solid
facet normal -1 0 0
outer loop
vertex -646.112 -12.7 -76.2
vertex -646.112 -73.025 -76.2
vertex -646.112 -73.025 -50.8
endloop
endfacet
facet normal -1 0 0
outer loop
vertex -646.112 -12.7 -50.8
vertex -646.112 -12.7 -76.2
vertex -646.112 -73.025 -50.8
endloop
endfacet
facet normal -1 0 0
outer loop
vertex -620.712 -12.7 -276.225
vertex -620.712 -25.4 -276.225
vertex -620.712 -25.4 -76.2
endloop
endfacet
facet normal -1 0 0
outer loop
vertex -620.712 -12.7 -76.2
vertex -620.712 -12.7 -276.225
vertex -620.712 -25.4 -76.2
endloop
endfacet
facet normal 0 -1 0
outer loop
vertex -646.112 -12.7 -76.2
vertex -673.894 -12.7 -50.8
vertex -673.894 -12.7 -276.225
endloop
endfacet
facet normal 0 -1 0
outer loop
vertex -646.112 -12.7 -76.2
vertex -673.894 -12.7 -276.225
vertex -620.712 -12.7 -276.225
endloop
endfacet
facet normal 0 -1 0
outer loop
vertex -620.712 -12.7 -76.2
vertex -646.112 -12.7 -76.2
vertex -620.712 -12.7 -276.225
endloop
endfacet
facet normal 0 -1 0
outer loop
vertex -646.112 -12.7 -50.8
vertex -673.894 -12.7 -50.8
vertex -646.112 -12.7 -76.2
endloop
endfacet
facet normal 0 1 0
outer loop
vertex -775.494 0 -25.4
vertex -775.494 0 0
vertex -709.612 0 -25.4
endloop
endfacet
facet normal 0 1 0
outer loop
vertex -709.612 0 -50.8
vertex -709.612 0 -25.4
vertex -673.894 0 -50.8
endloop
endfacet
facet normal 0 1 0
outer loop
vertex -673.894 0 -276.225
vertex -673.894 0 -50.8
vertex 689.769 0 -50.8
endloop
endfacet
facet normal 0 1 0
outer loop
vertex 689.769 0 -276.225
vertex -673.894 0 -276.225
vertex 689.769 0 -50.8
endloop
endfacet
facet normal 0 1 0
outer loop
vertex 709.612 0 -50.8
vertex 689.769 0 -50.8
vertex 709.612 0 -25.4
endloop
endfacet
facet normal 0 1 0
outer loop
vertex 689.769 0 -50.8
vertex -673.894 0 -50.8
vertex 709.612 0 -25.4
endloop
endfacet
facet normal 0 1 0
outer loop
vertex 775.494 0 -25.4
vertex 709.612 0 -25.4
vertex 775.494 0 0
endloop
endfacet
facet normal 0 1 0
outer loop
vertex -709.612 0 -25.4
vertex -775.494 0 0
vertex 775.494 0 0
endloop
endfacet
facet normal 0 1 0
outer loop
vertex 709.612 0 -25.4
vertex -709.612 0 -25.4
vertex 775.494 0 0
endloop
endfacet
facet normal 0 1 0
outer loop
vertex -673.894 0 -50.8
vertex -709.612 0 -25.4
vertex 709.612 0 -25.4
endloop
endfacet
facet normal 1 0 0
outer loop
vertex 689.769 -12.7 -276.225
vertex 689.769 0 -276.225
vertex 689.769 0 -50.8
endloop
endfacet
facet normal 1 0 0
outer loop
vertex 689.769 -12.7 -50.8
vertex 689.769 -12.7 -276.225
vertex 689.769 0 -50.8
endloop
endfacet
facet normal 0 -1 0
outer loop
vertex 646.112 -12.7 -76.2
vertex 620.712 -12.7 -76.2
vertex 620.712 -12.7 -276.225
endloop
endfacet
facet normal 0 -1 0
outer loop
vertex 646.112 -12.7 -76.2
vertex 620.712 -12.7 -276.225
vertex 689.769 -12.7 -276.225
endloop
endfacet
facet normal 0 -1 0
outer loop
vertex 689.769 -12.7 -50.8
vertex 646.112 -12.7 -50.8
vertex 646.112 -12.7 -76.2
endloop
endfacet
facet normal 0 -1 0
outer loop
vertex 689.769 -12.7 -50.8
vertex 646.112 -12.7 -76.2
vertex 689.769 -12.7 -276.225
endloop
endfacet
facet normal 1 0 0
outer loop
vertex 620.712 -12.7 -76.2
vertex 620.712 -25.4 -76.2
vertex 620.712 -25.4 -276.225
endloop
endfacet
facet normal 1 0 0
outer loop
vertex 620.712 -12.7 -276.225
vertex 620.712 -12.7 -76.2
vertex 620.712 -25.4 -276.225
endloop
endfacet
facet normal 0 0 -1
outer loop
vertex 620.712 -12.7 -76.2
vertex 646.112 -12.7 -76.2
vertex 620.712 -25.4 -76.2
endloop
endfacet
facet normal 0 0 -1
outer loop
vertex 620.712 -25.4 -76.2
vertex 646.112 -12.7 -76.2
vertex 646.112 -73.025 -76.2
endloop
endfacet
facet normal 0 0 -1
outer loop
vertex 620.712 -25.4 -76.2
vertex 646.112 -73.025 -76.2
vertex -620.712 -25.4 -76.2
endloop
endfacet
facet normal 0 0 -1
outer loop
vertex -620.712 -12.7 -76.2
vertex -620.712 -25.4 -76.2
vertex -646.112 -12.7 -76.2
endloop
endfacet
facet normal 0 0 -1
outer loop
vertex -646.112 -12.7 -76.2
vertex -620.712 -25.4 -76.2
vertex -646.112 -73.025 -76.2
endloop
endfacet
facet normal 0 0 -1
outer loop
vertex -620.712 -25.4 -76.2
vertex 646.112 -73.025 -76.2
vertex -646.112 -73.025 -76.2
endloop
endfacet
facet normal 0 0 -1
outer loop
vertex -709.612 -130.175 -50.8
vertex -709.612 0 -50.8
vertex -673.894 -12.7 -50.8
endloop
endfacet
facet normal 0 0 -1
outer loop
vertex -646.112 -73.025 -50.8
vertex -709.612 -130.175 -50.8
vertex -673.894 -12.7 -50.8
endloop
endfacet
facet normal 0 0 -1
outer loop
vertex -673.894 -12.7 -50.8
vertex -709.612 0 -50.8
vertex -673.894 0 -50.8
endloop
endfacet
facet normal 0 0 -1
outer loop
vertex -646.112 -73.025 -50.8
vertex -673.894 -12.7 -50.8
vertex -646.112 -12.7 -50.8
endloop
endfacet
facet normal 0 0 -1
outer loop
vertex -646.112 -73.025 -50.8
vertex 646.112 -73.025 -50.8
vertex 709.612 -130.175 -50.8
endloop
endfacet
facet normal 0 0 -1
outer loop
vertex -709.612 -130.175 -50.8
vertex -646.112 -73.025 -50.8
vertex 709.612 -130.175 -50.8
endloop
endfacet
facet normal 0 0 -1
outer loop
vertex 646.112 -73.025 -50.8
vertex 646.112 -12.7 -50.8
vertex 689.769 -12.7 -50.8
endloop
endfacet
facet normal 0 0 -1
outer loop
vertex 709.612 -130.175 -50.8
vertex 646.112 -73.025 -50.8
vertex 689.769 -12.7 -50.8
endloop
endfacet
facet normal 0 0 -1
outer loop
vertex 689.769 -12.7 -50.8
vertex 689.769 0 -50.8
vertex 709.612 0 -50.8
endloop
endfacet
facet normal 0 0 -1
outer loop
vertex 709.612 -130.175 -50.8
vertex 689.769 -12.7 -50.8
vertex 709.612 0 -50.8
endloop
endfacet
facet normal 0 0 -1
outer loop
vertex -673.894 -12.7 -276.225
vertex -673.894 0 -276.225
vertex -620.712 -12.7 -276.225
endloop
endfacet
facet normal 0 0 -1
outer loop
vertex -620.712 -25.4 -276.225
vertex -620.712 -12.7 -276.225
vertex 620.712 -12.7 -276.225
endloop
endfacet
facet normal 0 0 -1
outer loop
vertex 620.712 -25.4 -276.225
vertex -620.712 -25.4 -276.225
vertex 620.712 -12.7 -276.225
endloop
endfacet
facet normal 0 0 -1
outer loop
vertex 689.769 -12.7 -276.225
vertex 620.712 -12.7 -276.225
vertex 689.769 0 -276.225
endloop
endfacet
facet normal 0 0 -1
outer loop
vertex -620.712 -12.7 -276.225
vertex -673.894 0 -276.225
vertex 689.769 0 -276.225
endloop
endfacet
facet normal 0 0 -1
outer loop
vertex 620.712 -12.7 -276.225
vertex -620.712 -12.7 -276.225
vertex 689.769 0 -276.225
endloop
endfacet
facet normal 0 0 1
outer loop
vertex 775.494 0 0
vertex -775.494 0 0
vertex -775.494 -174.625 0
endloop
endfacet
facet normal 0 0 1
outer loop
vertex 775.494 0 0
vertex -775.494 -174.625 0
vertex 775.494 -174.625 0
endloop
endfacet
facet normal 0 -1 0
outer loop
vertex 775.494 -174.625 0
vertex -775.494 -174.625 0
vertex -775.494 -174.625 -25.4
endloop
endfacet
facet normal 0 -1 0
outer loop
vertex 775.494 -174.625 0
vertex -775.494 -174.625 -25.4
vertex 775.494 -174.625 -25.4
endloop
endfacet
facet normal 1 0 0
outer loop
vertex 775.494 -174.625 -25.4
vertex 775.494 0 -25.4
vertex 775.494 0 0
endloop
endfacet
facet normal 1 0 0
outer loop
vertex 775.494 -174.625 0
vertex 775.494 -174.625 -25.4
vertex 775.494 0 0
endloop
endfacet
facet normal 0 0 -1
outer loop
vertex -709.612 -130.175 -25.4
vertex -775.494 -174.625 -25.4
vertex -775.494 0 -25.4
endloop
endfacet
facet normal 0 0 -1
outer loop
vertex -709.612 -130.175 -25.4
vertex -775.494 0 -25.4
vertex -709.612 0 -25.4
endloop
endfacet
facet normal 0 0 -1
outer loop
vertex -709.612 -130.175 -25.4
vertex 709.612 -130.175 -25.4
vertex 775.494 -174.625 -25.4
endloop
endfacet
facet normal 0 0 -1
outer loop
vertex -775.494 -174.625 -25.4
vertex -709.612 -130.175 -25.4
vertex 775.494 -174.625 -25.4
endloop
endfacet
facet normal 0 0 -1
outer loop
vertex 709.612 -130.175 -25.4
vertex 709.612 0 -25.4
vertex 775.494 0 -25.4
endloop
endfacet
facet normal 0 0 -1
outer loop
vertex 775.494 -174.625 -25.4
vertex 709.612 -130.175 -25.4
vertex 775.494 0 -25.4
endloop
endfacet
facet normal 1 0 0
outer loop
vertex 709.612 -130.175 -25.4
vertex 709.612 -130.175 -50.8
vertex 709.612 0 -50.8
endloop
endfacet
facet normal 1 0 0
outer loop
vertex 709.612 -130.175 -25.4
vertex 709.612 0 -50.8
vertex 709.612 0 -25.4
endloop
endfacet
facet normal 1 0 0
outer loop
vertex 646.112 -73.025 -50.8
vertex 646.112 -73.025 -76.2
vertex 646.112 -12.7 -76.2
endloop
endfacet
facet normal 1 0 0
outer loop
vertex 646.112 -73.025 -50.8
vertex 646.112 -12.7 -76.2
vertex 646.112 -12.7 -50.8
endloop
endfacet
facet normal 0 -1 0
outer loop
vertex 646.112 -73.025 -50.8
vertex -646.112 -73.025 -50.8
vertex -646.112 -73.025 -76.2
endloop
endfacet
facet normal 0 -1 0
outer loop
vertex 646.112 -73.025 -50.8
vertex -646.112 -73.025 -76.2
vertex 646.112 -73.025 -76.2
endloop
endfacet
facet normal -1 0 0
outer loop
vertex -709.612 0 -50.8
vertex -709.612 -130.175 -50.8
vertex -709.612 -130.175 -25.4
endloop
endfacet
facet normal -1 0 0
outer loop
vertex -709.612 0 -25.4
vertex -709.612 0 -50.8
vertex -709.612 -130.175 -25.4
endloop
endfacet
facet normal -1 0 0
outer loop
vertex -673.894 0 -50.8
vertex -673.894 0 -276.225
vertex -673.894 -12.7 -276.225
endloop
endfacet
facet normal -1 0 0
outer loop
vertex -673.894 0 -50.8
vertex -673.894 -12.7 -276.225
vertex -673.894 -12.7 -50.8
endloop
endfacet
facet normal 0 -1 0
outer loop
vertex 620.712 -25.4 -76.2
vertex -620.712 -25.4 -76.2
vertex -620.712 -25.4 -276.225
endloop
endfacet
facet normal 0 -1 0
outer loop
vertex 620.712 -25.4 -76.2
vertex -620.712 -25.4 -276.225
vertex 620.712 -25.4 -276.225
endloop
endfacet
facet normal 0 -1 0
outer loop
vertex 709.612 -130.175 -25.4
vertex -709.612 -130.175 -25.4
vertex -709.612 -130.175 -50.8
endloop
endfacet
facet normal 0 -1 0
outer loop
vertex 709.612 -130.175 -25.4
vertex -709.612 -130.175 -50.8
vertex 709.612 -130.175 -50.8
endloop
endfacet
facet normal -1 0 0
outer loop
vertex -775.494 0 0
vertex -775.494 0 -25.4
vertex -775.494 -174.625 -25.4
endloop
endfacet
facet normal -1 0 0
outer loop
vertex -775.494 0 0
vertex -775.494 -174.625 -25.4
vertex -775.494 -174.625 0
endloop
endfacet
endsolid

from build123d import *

# Parameters (mm, degrees)
F0_W     = 1550.9875
F0_H     = 25.4
F1_DEPTH = 174.625
F3_W     = 1419.225
F3_H     = 25.4
F4_DEPTH = 130.175
F5_W     = 1292.225
F5_H     = 25.4
F6_DEPTH = 73.025
F2_W     = 1363.6625
F2_H     = 250.825
F7_DEPTH = 25.4
F9_DEPTH = 12.7


with BuildPart() as f1:
    # F0 (on Front) → F1 (new body)
    with BuildSketch(Plane.XZ):
        with Locations((0, -12.7)):
            Rectangle(F0_W, F0_H)
    extrude(amount=F1_DEPTH)

    # F3 (on Front) → F4 (join)
    with BuildSketch(Plane.XZ):
        with Locations((0, -38.1)):
            Rectangle(F3_W, F3_H)
    extrude(amount=F4_DEPTH)

    # F5 (on Front) → F6 (join)
    with BuildSketch(Plane.XZ):
        with Locations((0, -63.5)):
            Rectangle(F5_W, F5_H)
    extrude(amount=F6_DEPTH)

    # F2 (on Front) → F7 (join)
    with BuildSketch(Plane.XZ):
        with Locations((7.9375, -150.8125)):
            Rectangle(F2_W, F2_H)
    extrude(amount=F7_DEPTH)

    # F8 (on face) → F9 (cut)
    with BuildSketch(Plane.XZ.offset(25.4)):
        Polygon((-673.89375, -50.8), (-673.89375, -276.225), (-620.7125, -276.225), (-620.7125, -76.2), (-646.1125, -76.2), (-646.1125, -50.8), align=None)
        Polygon((620.7125, -76.2), (620.7125, -276.225), (689.76875, -276.225), (689.76875, -50.8), (646.1125, -50.8), (646.1125, -76.2), align=None)
    extrude(amount=-F9_DEPTH, mode=Mode.SUBTRACT)


solid = f1.part
